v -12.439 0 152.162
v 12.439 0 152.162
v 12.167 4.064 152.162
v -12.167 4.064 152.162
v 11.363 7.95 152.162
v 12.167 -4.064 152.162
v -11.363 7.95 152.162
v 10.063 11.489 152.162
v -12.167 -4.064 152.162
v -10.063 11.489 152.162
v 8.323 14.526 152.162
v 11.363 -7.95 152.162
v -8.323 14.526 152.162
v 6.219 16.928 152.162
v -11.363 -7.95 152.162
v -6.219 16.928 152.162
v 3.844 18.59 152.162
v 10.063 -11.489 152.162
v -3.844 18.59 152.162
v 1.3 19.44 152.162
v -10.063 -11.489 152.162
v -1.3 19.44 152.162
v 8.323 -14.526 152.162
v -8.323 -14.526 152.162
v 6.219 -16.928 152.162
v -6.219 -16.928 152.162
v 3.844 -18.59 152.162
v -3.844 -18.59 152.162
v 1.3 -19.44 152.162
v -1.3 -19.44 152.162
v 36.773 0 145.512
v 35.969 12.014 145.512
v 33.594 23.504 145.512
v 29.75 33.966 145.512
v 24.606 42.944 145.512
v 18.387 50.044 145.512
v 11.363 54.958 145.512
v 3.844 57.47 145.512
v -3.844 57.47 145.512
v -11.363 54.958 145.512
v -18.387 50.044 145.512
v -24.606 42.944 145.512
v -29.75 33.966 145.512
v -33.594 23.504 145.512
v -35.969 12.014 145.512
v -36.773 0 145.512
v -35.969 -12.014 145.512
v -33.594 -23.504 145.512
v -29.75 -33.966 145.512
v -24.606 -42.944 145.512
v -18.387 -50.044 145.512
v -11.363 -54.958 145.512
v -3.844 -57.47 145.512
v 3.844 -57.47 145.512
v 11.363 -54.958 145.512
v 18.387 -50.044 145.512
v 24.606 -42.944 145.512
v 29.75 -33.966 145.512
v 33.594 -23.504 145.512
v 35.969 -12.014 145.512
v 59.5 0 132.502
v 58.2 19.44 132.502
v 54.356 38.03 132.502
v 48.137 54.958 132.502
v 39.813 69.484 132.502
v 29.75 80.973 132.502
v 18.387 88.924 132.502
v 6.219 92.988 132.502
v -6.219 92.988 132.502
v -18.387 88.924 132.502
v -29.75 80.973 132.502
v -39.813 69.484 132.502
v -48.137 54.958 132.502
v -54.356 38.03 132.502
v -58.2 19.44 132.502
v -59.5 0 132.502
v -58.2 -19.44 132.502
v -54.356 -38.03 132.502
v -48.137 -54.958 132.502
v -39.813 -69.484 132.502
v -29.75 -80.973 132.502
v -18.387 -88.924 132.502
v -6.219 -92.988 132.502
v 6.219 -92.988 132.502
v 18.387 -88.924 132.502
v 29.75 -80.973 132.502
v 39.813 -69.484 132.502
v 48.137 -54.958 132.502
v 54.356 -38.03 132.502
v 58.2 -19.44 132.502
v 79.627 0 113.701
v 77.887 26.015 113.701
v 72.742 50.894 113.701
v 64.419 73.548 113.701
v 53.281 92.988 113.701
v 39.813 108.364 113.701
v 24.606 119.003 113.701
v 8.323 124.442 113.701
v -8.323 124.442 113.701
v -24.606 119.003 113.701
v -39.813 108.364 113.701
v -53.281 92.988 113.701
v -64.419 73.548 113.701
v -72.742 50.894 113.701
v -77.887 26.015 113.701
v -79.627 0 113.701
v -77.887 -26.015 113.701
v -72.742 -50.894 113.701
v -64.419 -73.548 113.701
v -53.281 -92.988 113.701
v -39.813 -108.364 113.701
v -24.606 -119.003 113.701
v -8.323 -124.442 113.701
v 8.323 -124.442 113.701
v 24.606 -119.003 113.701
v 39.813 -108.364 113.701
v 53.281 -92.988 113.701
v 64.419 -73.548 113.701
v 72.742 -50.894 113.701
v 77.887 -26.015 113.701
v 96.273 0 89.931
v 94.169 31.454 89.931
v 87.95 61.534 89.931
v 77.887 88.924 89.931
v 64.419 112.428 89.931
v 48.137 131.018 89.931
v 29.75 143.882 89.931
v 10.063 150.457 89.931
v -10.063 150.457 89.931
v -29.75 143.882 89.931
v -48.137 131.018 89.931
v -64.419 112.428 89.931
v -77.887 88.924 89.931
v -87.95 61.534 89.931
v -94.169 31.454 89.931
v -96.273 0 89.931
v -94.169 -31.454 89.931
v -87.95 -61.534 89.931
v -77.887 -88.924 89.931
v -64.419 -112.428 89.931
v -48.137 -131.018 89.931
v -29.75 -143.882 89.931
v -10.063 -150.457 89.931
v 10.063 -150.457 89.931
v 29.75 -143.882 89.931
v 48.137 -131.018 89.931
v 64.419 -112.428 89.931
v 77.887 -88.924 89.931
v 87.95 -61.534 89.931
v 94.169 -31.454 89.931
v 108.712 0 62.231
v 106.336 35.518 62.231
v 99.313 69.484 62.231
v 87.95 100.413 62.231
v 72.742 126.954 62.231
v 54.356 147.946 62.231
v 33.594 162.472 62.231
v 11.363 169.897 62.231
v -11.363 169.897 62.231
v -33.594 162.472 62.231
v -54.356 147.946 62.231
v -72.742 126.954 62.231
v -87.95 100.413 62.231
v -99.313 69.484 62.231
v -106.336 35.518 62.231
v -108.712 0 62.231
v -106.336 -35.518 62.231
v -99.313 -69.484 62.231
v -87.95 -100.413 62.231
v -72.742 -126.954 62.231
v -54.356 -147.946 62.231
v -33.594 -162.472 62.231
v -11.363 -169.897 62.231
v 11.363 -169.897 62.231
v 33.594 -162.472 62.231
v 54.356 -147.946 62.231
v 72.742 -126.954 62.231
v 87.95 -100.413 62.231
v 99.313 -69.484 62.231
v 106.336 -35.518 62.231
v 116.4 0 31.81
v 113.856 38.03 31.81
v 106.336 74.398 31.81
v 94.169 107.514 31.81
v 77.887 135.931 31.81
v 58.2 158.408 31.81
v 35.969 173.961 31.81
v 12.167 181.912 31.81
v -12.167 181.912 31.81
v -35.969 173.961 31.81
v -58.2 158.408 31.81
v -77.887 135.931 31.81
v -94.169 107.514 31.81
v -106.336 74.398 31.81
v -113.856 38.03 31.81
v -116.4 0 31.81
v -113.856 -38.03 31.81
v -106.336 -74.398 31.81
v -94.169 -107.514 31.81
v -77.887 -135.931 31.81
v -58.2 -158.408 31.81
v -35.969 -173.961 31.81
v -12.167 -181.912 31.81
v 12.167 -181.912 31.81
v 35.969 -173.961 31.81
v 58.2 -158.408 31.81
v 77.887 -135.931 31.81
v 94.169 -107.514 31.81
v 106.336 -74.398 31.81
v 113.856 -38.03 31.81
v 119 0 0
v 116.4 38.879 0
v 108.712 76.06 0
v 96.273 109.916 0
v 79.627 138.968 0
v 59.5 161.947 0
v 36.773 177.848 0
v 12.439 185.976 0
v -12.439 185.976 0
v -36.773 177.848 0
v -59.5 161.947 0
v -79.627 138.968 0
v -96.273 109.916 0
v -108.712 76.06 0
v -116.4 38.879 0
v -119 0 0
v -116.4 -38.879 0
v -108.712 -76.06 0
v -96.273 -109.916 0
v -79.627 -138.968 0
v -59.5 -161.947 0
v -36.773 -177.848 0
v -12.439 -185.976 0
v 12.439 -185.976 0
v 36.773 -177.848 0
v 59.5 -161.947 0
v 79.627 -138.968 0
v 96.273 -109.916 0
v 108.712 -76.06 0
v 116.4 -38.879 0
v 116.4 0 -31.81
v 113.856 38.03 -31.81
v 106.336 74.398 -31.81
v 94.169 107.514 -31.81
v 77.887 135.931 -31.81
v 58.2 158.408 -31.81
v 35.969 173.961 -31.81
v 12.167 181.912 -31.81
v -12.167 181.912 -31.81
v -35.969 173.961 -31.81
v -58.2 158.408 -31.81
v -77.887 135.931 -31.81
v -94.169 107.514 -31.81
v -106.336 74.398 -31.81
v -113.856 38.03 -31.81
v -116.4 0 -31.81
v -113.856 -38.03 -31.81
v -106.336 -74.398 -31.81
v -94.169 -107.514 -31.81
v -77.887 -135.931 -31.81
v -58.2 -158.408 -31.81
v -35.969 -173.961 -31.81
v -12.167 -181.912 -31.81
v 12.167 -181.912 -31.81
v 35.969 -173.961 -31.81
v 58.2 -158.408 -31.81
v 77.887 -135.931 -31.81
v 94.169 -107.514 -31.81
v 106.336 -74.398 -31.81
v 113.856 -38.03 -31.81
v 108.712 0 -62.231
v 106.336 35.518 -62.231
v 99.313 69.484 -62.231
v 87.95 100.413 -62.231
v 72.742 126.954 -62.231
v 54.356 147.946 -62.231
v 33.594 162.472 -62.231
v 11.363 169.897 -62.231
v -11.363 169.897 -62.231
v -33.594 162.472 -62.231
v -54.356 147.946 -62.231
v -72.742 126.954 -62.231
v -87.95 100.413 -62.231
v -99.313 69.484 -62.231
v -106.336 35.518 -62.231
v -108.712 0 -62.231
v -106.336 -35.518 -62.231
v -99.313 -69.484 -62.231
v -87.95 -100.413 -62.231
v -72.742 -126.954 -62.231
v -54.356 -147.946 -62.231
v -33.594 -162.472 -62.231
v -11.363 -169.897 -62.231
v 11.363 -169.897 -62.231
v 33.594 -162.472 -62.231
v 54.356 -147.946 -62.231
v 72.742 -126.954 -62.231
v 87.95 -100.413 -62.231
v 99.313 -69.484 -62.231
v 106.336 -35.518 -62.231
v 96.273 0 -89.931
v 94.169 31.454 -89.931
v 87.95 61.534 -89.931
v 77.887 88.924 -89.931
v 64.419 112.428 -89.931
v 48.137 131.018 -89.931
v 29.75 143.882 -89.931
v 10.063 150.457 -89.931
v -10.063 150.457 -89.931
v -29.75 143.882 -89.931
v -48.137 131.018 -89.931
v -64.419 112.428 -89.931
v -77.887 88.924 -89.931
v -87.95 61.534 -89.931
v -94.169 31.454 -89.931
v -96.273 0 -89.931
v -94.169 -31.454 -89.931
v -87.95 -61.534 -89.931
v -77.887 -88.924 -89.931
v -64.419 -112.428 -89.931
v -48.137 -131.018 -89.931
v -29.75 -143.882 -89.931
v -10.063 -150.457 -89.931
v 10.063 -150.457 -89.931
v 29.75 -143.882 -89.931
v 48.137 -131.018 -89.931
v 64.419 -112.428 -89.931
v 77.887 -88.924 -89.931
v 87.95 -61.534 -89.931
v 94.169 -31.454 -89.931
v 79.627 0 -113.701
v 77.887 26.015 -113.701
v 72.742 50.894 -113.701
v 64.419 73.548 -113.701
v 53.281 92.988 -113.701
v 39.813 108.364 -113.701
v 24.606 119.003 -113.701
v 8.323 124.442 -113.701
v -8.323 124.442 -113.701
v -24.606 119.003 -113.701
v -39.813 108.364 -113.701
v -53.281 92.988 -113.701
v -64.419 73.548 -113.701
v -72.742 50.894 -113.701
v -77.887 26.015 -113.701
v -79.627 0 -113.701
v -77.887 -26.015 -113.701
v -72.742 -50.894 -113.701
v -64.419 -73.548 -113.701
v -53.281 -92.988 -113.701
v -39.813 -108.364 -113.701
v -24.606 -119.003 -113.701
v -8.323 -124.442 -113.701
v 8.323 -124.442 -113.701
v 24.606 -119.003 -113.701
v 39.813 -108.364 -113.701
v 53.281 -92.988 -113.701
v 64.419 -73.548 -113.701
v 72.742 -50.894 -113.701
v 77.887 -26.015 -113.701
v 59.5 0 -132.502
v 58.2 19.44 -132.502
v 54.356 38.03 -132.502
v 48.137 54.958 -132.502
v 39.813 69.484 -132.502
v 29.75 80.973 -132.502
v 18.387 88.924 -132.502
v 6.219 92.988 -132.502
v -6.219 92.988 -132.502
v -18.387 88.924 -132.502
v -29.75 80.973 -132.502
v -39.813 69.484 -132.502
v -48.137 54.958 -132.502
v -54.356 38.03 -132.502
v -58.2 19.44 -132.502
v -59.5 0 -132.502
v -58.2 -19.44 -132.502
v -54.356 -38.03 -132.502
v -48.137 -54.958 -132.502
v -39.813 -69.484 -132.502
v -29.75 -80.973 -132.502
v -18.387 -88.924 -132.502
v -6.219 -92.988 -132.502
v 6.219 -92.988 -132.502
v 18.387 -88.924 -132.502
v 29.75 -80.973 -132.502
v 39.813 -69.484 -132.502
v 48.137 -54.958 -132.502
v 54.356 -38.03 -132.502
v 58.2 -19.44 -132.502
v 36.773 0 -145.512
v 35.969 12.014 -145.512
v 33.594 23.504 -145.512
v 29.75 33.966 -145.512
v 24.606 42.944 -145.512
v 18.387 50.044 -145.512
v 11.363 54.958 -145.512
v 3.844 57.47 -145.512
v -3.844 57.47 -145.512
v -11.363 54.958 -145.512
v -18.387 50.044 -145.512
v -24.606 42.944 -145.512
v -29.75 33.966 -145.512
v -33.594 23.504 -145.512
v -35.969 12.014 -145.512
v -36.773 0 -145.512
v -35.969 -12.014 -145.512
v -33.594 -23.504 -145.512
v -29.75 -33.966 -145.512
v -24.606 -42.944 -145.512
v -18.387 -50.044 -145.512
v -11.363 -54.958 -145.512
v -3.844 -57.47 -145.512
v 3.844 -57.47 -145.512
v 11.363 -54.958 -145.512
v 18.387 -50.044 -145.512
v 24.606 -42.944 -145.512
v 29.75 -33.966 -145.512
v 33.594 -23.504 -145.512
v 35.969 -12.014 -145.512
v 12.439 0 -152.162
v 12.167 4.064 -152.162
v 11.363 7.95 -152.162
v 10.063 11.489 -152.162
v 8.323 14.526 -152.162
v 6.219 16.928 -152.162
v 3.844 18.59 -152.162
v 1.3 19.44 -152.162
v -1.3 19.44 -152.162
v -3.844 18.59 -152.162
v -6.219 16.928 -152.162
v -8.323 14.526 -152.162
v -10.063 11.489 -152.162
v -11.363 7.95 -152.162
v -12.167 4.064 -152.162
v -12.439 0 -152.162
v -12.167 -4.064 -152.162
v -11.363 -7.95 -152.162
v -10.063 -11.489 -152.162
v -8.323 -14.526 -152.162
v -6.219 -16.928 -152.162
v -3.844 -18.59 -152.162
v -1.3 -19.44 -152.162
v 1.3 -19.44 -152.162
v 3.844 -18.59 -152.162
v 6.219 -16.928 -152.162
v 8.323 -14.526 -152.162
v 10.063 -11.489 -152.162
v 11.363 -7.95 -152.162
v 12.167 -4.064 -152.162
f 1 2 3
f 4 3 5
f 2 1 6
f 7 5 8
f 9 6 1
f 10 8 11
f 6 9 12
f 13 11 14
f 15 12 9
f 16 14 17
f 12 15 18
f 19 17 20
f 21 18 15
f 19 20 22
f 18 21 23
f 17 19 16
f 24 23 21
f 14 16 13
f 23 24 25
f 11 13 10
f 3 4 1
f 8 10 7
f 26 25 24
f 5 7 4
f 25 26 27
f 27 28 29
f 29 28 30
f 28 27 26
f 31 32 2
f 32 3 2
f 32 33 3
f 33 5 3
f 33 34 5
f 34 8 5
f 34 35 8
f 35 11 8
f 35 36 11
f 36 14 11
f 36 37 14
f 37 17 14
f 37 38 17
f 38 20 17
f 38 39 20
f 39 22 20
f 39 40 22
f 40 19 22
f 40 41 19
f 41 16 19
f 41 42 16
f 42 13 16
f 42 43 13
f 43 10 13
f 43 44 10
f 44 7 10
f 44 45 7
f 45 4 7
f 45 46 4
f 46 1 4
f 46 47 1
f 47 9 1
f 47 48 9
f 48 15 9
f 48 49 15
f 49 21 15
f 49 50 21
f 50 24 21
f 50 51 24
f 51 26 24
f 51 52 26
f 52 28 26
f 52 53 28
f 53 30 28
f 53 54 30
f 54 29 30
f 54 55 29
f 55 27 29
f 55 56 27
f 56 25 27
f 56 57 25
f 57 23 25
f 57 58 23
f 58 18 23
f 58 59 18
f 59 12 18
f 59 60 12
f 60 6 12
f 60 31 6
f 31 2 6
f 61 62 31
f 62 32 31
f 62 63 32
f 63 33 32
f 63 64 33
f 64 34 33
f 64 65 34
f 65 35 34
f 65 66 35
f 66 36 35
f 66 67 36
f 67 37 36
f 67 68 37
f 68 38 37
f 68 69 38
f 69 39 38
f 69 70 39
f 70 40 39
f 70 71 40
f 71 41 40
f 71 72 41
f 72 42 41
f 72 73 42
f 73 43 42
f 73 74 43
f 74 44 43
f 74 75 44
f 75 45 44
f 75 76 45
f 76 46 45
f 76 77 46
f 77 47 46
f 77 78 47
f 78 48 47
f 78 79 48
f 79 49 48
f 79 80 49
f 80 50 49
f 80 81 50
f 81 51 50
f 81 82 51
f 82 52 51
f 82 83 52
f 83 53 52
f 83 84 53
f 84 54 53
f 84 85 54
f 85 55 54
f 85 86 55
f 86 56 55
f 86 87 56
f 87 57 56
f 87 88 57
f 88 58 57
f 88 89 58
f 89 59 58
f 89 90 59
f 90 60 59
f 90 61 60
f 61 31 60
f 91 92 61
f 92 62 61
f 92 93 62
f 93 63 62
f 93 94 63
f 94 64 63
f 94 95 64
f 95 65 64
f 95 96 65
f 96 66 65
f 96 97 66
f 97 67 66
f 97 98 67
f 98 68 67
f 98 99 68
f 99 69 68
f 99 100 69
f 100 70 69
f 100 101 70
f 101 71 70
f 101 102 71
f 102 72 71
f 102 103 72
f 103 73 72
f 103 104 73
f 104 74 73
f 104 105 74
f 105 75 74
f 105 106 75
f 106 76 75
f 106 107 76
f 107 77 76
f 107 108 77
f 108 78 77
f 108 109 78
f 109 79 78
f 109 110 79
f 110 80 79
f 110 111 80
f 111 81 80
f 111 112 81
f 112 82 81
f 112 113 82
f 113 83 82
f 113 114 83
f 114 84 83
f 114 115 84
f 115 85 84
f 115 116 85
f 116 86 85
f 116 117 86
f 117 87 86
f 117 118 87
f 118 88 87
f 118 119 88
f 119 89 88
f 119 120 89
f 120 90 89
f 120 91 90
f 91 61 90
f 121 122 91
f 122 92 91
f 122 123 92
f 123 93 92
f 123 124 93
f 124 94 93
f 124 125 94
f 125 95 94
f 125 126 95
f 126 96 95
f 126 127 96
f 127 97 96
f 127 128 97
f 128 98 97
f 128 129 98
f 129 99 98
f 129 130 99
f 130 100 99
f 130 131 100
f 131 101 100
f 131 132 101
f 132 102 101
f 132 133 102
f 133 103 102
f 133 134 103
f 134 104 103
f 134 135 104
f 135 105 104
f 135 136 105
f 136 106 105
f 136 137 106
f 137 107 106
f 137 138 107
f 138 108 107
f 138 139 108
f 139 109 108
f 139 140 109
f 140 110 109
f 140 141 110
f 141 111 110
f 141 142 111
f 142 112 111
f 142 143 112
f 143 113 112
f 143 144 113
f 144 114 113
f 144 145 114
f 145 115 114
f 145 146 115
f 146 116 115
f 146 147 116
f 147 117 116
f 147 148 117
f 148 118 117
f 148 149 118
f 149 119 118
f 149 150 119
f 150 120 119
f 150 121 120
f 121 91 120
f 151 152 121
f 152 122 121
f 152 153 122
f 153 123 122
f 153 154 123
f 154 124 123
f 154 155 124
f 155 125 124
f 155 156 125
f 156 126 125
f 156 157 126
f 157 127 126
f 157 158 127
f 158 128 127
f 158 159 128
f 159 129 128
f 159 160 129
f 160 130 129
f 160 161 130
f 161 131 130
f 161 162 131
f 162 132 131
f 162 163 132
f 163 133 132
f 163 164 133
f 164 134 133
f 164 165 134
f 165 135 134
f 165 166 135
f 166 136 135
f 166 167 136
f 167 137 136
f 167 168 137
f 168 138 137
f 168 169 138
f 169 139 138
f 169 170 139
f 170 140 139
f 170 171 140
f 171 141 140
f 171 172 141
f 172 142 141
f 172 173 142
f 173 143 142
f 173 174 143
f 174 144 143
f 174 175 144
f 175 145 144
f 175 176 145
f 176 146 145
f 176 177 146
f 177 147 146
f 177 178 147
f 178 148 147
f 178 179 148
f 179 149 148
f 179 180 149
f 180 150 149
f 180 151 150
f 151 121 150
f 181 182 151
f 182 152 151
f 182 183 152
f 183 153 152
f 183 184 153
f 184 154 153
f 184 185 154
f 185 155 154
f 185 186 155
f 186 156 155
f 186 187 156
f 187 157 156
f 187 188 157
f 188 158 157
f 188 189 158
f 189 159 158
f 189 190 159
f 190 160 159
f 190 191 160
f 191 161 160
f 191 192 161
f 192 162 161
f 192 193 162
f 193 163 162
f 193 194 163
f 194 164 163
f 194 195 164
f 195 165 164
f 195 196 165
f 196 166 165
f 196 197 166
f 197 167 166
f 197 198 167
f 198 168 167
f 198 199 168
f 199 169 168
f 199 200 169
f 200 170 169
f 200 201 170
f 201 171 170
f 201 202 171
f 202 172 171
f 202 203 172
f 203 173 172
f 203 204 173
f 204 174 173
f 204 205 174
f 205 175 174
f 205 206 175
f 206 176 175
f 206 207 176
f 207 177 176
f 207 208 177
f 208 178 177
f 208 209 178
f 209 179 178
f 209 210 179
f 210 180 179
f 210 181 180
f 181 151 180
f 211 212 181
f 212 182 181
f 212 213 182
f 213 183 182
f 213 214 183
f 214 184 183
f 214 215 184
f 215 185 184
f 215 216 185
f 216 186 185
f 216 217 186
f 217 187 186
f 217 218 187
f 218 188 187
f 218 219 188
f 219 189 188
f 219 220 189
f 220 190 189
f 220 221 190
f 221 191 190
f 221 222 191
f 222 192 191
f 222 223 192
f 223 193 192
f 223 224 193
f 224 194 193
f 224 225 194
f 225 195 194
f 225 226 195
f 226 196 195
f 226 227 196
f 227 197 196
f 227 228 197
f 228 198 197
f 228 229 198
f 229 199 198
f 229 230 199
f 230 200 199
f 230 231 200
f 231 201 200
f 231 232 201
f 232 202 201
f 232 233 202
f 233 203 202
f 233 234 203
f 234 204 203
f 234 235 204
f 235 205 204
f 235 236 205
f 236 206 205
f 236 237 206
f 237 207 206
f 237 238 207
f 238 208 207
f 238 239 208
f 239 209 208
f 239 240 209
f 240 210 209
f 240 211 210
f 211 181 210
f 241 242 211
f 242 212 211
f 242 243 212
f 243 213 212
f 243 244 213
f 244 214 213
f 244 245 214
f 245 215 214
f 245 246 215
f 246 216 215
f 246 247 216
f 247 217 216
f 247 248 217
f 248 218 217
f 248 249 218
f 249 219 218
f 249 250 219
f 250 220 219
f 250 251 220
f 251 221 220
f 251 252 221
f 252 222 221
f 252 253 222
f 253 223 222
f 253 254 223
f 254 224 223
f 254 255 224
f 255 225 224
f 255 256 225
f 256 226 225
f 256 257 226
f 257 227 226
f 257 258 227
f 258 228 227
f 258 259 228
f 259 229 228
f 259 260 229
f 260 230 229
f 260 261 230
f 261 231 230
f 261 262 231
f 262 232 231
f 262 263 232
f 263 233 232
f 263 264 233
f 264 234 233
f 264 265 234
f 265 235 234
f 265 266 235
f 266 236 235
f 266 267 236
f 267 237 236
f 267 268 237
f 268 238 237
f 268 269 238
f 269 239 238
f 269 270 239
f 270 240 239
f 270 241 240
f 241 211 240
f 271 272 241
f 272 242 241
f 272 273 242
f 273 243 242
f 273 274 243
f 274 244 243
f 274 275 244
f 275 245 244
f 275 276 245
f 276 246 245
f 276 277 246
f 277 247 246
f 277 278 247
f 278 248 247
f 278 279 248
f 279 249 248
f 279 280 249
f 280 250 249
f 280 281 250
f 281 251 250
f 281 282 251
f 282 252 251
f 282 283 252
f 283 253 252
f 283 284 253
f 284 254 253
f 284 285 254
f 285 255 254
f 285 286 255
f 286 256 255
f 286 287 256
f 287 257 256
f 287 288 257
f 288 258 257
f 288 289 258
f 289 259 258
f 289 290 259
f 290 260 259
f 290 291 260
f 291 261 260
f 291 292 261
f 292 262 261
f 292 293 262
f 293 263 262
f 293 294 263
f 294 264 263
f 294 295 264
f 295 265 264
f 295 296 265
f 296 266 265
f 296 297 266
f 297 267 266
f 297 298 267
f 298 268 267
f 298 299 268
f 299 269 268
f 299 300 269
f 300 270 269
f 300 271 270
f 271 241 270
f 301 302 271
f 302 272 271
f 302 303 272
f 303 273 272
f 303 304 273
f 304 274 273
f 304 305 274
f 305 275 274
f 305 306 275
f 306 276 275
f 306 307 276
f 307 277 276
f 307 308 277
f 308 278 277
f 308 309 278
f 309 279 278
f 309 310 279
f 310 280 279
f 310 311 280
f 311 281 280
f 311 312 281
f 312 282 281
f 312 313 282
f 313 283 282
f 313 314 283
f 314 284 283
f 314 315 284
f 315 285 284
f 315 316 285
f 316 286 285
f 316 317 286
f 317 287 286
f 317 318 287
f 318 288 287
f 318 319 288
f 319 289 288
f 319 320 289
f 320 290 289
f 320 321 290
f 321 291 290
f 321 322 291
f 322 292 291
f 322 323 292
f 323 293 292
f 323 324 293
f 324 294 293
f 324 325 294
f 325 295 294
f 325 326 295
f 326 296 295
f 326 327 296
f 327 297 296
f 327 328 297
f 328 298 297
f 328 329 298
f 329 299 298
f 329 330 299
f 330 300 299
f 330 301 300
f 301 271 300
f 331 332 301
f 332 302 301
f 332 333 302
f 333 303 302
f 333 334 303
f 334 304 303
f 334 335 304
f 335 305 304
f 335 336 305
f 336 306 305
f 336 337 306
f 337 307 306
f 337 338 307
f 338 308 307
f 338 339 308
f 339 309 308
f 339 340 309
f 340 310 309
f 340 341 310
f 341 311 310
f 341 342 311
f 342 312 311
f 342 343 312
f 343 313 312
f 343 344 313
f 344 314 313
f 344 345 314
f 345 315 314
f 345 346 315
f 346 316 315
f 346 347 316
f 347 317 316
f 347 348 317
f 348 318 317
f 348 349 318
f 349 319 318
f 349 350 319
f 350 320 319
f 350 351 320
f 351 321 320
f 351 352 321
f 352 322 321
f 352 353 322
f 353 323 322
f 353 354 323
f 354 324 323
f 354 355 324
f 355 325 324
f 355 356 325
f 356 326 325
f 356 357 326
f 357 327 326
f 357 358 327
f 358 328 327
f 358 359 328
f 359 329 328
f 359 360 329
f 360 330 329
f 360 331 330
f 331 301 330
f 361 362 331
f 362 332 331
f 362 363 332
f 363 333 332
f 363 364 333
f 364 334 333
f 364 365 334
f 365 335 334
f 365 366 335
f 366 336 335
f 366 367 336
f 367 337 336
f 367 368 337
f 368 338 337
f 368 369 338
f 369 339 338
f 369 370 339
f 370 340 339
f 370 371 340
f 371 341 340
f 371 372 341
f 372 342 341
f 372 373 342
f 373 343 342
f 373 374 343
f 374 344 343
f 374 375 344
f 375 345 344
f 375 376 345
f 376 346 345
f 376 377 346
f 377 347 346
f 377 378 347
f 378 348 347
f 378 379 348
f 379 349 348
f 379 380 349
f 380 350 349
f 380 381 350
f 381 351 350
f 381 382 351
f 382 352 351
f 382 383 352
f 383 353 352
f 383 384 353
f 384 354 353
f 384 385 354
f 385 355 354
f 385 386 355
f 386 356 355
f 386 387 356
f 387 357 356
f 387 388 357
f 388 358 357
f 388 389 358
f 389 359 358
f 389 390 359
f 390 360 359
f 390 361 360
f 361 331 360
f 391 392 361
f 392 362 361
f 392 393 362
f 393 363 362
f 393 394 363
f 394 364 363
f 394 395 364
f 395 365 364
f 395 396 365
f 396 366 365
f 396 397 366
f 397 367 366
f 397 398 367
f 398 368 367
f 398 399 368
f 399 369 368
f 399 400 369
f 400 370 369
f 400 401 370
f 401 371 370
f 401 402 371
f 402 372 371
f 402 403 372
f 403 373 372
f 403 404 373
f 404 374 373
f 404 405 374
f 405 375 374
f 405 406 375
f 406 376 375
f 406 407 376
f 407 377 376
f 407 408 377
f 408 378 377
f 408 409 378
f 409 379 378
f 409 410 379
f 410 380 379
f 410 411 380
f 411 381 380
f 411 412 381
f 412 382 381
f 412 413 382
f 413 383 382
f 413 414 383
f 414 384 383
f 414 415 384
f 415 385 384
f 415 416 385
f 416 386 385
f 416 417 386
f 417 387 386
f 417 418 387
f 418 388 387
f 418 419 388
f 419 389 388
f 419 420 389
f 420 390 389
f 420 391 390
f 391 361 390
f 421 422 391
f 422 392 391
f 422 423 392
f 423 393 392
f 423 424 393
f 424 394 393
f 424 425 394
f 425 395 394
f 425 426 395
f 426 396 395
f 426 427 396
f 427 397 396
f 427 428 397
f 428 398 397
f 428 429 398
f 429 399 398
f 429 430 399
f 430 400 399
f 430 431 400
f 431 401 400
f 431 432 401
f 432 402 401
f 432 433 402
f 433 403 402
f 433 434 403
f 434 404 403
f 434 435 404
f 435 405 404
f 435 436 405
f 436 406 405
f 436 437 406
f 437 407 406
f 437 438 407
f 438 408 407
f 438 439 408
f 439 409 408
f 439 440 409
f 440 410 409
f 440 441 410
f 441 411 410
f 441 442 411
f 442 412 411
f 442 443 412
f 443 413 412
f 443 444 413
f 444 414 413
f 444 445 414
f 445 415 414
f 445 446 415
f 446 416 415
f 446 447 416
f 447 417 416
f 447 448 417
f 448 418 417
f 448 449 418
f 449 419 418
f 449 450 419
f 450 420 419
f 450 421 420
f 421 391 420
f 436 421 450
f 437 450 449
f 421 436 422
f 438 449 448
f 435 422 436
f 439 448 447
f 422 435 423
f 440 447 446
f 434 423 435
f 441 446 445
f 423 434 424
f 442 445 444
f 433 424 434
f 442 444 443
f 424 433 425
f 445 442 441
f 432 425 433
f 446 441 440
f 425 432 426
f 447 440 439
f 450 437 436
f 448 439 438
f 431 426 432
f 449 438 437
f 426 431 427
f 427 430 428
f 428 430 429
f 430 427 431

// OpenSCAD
// Generated by SolidPython 1.0.1 on 2020-07-29 00:46:47


scale(v = [7, 11, 9]) {
	sphere(r = 17);
}
/***********************************************
*********      SolidPython code:      **********
************************************************
 
# import packages: SolidPython
from solid import *
from solid.utils import *
from itertools import chain, combinations, permutations


class Resize:

    def __init__(self, scad_file):
        self.scad_file = scad_file
        #self.scad_file = import_scad(scad_file)
        # cone/cylinder param:
        self.r1 = 0
        self.r2 = 0
        self.h = 0
        # rectangular prism param:
        self.w = 0
        self.l = 0
        # ellipse param:
        self.r = 0

    # import OpenScad code (file name corresponds to shape)


    # classify shape + parameters
    def assign(self, param1, param2, param3):
        if self.scad_file == 'cone.scad':
            self.r1 = param1
            self.r2 = param2
            self.h = param3
        elif self.scad_file == 'cylinder.scad':
            self.r1 = param1
            self.r2 = param2
            self.h = param3
        elif self.scad_file == 'rectangularPrism.scad':
            self.h = param1
            self.l = param2
            self.w = param3
        else:
            self.r = param1
            self.h = param2

    # resize parameters
    def iterate(self):
        x = range(3, 20, 2)
        i = 1
        if self.scad_file == 'cone.scad':
            tempList = list(permutations(x, 2))
            for temp in tempList:
                param1 = temp[0]
                param2 = temp[1]
                filepath = 'produced_scad_files/' + 'cone' + str(param1) + '_' + str(param2) + '_' + '.scad'
                scad_render_to_file(cylinder(h=param1, r1=param2, r2=0), filepath)

        elif self.scad_file == 'cylinder.scad':
            tempList = list(permutations(x, 3))
            for temp in tempList:
                param1 = temp[0]
                param2 = temp[1]
                filepath = 'produced_scad_files/' + 'cylinder' + str(param1) + '_' + str(param2) + '_' + '.scad'
                scad_render_to_file(cylinder(h=param1, r1=param2, r2=param2), filepath)

        elif self.scad_file == 'rectangularPrism.scad':
            tempList = list(permutations(x, 3))
            for temp in tempList:
                param1 = temp[0]
                param2 = temp[1]
                param3 = temp[2]
                filepath = 'produced_scad_files/' + 'rectangularPrism' + str(param1) + '_' + str(param2) + '_' + str(
                    param3) + '.scad'
                scad_render_to_file(cube(size=(param1, param2, param3)), filepath)

        elif self.scad_file == 'ellipse.scad':
            tempList = list(permutations(x, 4))
            for temp in tempList:
                param1 = temp[0]
                param2 = temp[1]
                param3 = temp[2]
                param4 = temp[3]
                filepath = 'produced_scad_files/' + 'ellipse' + str(param1) + '_' + str(param2) + '_' + str(param3) + '_' + str(param4) + '.scad'
                scad_render_to_file(scale([param1, param2, param3])(sphere(r=param4)), filepath)

    def render_to_scadfile(self):
        scad_render_to_file(scad, 'example.scad') 
 
************************************************/
